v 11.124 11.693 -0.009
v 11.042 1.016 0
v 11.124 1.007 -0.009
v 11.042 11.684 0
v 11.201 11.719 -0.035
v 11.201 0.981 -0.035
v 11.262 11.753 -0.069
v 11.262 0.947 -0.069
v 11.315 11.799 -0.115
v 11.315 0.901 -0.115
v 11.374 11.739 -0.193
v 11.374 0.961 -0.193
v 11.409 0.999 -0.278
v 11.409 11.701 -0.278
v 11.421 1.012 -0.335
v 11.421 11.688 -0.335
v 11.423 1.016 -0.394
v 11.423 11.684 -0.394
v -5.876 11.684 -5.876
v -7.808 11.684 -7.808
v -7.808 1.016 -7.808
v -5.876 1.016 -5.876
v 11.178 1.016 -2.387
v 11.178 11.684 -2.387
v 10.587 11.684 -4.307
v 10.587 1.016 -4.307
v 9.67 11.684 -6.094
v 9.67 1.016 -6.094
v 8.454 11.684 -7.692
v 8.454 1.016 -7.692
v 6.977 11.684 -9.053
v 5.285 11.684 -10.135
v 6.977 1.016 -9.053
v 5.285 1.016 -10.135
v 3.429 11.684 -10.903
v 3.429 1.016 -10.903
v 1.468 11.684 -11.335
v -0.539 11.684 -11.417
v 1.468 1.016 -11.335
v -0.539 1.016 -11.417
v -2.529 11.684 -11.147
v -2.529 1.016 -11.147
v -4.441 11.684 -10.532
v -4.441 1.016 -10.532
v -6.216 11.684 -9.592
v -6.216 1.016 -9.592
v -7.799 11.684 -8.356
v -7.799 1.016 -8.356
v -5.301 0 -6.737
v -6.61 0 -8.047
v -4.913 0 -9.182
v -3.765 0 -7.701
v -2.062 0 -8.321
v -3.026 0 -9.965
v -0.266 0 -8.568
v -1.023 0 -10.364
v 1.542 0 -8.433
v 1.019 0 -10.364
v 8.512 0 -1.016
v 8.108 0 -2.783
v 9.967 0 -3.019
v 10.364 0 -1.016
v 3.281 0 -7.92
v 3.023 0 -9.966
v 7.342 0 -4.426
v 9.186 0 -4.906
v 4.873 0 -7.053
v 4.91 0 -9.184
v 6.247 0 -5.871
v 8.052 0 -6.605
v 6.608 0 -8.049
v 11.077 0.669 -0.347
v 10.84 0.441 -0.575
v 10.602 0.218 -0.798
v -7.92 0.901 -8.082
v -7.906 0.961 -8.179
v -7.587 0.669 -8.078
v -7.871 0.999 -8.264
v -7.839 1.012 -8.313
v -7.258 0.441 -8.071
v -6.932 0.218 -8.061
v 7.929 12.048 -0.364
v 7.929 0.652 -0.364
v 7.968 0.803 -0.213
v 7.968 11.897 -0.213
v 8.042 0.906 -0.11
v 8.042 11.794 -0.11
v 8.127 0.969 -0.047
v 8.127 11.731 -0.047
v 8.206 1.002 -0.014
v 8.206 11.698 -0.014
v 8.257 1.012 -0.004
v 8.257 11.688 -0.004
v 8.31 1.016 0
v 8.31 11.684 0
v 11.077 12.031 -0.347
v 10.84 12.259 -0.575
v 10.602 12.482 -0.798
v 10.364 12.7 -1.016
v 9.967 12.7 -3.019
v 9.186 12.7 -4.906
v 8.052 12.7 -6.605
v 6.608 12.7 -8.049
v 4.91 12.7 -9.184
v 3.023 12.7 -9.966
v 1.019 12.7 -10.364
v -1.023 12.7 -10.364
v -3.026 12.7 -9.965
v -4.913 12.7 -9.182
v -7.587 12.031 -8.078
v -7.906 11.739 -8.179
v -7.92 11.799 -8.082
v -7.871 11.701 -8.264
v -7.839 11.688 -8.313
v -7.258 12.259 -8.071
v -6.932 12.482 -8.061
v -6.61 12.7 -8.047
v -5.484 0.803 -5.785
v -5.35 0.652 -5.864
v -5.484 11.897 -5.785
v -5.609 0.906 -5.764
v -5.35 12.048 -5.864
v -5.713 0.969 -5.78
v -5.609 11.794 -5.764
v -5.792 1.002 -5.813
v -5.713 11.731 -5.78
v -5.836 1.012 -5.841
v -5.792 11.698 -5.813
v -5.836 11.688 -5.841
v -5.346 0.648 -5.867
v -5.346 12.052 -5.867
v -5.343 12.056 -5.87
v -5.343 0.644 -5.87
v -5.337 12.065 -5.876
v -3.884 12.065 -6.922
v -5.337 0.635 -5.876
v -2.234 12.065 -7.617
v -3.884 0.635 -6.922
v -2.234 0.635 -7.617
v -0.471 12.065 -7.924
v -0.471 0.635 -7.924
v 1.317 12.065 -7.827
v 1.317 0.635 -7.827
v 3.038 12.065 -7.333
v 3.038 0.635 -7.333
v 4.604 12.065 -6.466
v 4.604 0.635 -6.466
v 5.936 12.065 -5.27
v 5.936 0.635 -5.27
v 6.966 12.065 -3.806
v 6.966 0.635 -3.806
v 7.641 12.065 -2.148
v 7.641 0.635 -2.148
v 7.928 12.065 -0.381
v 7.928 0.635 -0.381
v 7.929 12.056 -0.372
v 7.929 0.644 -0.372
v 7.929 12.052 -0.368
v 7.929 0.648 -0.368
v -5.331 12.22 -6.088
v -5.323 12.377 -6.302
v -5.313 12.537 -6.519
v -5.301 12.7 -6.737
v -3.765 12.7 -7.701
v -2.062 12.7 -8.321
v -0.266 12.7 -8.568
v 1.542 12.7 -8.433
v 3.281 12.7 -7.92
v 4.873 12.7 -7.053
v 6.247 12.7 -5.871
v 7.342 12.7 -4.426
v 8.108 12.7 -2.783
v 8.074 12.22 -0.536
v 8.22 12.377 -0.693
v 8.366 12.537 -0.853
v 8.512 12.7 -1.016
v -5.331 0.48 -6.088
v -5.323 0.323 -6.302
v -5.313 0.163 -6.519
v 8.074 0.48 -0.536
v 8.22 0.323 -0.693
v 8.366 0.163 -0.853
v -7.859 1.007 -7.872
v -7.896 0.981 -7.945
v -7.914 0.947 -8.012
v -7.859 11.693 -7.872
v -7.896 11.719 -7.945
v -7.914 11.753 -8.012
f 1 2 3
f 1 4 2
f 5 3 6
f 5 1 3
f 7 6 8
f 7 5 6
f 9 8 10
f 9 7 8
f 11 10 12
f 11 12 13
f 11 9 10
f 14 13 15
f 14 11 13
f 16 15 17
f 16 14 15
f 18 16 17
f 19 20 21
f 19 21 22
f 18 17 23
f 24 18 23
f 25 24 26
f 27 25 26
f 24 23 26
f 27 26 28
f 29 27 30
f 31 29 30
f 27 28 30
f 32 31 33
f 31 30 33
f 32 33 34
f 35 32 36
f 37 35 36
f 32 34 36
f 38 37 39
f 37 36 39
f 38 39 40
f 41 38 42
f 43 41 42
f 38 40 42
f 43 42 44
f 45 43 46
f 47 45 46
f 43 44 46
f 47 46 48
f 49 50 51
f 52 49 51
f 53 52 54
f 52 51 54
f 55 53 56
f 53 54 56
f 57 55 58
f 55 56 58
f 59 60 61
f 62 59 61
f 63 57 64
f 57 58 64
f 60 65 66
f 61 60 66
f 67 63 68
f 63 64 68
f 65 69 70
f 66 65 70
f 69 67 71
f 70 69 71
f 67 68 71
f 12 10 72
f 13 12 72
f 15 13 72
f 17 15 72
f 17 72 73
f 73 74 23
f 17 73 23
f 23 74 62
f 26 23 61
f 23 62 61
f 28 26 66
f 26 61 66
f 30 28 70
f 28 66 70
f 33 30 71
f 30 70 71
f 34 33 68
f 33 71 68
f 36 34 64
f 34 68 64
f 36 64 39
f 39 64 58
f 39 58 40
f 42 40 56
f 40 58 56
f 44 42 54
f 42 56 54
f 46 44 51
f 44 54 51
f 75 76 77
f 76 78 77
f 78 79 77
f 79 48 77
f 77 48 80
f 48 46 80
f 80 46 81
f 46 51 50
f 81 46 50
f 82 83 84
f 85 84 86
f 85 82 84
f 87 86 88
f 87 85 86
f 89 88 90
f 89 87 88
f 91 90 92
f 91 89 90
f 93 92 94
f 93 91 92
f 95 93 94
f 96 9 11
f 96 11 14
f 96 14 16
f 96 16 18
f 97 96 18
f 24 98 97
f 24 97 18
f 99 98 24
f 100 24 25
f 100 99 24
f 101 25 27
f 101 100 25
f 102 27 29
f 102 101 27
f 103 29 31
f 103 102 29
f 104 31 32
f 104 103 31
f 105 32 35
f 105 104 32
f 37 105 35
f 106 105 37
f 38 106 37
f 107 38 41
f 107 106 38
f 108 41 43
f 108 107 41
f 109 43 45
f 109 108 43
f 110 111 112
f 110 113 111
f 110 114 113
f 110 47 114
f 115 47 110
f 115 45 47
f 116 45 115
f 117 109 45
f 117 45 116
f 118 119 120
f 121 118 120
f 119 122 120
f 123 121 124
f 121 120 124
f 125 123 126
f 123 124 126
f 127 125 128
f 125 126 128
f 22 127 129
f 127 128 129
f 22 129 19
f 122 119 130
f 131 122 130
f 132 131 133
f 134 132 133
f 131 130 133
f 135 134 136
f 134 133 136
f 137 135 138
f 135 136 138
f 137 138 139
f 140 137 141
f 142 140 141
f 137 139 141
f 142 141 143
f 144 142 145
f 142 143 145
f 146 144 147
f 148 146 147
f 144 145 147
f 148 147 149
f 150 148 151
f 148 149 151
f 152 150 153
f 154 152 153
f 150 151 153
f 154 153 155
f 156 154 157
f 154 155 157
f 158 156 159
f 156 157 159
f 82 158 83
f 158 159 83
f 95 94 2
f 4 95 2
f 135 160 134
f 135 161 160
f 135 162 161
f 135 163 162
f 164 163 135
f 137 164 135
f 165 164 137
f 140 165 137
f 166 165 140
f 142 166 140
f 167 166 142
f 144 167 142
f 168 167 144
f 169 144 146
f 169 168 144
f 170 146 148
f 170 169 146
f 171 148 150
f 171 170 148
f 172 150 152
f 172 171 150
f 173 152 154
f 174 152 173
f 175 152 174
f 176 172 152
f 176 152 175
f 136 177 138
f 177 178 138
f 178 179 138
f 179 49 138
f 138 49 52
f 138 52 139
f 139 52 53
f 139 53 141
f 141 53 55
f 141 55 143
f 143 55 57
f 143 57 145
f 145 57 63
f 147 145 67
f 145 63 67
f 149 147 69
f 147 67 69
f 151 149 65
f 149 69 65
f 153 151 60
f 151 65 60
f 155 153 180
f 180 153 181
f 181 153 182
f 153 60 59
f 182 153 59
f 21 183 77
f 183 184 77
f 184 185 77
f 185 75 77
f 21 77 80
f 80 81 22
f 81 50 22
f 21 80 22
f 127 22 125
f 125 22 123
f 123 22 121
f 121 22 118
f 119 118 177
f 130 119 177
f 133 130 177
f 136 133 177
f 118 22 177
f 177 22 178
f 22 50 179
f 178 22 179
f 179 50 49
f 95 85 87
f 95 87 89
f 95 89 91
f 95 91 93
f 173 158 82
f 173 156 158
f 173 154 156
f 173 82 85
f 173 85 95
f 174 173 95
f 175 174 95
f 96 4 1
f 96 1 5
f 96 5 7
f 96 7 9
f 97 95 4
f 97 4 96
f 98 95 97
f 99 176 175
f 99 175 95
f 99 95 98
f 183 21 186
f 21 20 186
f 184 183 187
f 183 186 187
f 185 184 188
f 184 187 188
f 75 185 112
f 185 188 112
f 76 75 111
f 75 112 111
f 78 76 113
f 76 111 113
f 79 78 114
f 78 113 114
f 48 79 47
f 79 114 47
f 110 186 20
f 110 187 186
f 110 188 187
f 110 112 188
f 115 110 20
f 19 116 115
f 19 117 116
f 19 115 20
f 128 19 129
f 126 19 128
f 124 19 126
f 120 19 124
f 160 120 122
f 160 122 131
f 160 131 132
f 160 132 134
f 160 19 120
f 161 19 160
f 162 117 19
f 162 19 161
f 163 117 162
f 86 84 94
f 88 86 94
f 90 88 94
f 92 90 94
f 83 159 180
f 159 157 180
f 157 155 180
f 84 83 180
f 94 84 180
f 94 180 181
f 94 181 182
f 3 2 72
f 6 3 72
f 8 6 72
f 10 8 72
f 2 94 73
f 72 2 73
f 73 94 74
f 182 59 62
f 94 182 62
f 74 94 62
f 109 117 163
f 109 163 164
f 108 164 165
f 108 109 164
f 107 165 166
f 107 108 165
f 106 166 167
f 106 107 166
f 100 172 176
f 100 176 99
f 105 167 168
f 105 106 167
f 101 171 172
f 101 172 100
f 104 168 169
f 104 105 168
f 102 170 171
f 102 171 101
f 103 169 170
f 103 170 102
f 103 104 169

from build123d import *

# Parameters (mm, degrees)
BOSS_EXTRUDE1_DEPTH = 12.7
CHAMFER1_SIZE       = 1.016
CHAMFER2_SIZE       = 0.635
FILLET1_R           = 0.381


with BuildPart() as part:
    # Sketch1 → Boss-Extrude1 (new body)
    with BuildSketch(Plane(origin=(0, 0, 0), x_dir=(1, 0, 0), z_dir=(0, 1, 0))):
        with BuildLine():
            ThreePointArc((-5.612660076, 5.612660076), (3.037549744, 7.333293789), (7.9375, 0))
            Line((7.9375, 0), (11.43, 0))
            ThreePointArc((11.43, 0), (4.374071632, 10.559943057), (-8.082230509, 8.082230509))
            Line((-8.082230509, 8.082230509), (-5.612660076, 5.612660076))
        make_face()
    extrude(amount=BOSS_EXTRUDE1_DEPTH)

    # Chamfer1
    chamfer1_edges = [part.edges().sort_by_distance(p)[0] for p in [
        (-6.847445292, 12.7, -6.847445292),
        (9.68375, 12.7, 0),
        (-6.847445292, 0, -6.847445292),
        (4.374071632, 0, -10.559943057),
        (9.68375, 0, 0),
        (4.374071632, 12.7, -10.559943057),
    ]]
    chamfer(chamfer1_edges, length=CHAMFER1_SIZE)

    # Chamfer2
    chamfer2_edges = [part.edges().sort_by_distance(p)[0] for p in [
        (3.037549744, 0, -7.333293789),
        (3.037549744, 12.7, -7.333293789),
    ]]
    chamfer(chamfer2_edges, length=CHAMFER2_SIZE)

    # Fillet1
    fillet1_edges = [part.edges().sort_by_distance(p)[0] for p in [
        (7.9375, 6.35, 0),
        (11.43, 6.35, 0),
        (-8.082230509, 6.35, -8.082230509),
        (-5.612660076, 6.35, -5.612660076),
    ]]
    fillet(fillet1_edges, radius=FILLET1_R)


solid = part.part
